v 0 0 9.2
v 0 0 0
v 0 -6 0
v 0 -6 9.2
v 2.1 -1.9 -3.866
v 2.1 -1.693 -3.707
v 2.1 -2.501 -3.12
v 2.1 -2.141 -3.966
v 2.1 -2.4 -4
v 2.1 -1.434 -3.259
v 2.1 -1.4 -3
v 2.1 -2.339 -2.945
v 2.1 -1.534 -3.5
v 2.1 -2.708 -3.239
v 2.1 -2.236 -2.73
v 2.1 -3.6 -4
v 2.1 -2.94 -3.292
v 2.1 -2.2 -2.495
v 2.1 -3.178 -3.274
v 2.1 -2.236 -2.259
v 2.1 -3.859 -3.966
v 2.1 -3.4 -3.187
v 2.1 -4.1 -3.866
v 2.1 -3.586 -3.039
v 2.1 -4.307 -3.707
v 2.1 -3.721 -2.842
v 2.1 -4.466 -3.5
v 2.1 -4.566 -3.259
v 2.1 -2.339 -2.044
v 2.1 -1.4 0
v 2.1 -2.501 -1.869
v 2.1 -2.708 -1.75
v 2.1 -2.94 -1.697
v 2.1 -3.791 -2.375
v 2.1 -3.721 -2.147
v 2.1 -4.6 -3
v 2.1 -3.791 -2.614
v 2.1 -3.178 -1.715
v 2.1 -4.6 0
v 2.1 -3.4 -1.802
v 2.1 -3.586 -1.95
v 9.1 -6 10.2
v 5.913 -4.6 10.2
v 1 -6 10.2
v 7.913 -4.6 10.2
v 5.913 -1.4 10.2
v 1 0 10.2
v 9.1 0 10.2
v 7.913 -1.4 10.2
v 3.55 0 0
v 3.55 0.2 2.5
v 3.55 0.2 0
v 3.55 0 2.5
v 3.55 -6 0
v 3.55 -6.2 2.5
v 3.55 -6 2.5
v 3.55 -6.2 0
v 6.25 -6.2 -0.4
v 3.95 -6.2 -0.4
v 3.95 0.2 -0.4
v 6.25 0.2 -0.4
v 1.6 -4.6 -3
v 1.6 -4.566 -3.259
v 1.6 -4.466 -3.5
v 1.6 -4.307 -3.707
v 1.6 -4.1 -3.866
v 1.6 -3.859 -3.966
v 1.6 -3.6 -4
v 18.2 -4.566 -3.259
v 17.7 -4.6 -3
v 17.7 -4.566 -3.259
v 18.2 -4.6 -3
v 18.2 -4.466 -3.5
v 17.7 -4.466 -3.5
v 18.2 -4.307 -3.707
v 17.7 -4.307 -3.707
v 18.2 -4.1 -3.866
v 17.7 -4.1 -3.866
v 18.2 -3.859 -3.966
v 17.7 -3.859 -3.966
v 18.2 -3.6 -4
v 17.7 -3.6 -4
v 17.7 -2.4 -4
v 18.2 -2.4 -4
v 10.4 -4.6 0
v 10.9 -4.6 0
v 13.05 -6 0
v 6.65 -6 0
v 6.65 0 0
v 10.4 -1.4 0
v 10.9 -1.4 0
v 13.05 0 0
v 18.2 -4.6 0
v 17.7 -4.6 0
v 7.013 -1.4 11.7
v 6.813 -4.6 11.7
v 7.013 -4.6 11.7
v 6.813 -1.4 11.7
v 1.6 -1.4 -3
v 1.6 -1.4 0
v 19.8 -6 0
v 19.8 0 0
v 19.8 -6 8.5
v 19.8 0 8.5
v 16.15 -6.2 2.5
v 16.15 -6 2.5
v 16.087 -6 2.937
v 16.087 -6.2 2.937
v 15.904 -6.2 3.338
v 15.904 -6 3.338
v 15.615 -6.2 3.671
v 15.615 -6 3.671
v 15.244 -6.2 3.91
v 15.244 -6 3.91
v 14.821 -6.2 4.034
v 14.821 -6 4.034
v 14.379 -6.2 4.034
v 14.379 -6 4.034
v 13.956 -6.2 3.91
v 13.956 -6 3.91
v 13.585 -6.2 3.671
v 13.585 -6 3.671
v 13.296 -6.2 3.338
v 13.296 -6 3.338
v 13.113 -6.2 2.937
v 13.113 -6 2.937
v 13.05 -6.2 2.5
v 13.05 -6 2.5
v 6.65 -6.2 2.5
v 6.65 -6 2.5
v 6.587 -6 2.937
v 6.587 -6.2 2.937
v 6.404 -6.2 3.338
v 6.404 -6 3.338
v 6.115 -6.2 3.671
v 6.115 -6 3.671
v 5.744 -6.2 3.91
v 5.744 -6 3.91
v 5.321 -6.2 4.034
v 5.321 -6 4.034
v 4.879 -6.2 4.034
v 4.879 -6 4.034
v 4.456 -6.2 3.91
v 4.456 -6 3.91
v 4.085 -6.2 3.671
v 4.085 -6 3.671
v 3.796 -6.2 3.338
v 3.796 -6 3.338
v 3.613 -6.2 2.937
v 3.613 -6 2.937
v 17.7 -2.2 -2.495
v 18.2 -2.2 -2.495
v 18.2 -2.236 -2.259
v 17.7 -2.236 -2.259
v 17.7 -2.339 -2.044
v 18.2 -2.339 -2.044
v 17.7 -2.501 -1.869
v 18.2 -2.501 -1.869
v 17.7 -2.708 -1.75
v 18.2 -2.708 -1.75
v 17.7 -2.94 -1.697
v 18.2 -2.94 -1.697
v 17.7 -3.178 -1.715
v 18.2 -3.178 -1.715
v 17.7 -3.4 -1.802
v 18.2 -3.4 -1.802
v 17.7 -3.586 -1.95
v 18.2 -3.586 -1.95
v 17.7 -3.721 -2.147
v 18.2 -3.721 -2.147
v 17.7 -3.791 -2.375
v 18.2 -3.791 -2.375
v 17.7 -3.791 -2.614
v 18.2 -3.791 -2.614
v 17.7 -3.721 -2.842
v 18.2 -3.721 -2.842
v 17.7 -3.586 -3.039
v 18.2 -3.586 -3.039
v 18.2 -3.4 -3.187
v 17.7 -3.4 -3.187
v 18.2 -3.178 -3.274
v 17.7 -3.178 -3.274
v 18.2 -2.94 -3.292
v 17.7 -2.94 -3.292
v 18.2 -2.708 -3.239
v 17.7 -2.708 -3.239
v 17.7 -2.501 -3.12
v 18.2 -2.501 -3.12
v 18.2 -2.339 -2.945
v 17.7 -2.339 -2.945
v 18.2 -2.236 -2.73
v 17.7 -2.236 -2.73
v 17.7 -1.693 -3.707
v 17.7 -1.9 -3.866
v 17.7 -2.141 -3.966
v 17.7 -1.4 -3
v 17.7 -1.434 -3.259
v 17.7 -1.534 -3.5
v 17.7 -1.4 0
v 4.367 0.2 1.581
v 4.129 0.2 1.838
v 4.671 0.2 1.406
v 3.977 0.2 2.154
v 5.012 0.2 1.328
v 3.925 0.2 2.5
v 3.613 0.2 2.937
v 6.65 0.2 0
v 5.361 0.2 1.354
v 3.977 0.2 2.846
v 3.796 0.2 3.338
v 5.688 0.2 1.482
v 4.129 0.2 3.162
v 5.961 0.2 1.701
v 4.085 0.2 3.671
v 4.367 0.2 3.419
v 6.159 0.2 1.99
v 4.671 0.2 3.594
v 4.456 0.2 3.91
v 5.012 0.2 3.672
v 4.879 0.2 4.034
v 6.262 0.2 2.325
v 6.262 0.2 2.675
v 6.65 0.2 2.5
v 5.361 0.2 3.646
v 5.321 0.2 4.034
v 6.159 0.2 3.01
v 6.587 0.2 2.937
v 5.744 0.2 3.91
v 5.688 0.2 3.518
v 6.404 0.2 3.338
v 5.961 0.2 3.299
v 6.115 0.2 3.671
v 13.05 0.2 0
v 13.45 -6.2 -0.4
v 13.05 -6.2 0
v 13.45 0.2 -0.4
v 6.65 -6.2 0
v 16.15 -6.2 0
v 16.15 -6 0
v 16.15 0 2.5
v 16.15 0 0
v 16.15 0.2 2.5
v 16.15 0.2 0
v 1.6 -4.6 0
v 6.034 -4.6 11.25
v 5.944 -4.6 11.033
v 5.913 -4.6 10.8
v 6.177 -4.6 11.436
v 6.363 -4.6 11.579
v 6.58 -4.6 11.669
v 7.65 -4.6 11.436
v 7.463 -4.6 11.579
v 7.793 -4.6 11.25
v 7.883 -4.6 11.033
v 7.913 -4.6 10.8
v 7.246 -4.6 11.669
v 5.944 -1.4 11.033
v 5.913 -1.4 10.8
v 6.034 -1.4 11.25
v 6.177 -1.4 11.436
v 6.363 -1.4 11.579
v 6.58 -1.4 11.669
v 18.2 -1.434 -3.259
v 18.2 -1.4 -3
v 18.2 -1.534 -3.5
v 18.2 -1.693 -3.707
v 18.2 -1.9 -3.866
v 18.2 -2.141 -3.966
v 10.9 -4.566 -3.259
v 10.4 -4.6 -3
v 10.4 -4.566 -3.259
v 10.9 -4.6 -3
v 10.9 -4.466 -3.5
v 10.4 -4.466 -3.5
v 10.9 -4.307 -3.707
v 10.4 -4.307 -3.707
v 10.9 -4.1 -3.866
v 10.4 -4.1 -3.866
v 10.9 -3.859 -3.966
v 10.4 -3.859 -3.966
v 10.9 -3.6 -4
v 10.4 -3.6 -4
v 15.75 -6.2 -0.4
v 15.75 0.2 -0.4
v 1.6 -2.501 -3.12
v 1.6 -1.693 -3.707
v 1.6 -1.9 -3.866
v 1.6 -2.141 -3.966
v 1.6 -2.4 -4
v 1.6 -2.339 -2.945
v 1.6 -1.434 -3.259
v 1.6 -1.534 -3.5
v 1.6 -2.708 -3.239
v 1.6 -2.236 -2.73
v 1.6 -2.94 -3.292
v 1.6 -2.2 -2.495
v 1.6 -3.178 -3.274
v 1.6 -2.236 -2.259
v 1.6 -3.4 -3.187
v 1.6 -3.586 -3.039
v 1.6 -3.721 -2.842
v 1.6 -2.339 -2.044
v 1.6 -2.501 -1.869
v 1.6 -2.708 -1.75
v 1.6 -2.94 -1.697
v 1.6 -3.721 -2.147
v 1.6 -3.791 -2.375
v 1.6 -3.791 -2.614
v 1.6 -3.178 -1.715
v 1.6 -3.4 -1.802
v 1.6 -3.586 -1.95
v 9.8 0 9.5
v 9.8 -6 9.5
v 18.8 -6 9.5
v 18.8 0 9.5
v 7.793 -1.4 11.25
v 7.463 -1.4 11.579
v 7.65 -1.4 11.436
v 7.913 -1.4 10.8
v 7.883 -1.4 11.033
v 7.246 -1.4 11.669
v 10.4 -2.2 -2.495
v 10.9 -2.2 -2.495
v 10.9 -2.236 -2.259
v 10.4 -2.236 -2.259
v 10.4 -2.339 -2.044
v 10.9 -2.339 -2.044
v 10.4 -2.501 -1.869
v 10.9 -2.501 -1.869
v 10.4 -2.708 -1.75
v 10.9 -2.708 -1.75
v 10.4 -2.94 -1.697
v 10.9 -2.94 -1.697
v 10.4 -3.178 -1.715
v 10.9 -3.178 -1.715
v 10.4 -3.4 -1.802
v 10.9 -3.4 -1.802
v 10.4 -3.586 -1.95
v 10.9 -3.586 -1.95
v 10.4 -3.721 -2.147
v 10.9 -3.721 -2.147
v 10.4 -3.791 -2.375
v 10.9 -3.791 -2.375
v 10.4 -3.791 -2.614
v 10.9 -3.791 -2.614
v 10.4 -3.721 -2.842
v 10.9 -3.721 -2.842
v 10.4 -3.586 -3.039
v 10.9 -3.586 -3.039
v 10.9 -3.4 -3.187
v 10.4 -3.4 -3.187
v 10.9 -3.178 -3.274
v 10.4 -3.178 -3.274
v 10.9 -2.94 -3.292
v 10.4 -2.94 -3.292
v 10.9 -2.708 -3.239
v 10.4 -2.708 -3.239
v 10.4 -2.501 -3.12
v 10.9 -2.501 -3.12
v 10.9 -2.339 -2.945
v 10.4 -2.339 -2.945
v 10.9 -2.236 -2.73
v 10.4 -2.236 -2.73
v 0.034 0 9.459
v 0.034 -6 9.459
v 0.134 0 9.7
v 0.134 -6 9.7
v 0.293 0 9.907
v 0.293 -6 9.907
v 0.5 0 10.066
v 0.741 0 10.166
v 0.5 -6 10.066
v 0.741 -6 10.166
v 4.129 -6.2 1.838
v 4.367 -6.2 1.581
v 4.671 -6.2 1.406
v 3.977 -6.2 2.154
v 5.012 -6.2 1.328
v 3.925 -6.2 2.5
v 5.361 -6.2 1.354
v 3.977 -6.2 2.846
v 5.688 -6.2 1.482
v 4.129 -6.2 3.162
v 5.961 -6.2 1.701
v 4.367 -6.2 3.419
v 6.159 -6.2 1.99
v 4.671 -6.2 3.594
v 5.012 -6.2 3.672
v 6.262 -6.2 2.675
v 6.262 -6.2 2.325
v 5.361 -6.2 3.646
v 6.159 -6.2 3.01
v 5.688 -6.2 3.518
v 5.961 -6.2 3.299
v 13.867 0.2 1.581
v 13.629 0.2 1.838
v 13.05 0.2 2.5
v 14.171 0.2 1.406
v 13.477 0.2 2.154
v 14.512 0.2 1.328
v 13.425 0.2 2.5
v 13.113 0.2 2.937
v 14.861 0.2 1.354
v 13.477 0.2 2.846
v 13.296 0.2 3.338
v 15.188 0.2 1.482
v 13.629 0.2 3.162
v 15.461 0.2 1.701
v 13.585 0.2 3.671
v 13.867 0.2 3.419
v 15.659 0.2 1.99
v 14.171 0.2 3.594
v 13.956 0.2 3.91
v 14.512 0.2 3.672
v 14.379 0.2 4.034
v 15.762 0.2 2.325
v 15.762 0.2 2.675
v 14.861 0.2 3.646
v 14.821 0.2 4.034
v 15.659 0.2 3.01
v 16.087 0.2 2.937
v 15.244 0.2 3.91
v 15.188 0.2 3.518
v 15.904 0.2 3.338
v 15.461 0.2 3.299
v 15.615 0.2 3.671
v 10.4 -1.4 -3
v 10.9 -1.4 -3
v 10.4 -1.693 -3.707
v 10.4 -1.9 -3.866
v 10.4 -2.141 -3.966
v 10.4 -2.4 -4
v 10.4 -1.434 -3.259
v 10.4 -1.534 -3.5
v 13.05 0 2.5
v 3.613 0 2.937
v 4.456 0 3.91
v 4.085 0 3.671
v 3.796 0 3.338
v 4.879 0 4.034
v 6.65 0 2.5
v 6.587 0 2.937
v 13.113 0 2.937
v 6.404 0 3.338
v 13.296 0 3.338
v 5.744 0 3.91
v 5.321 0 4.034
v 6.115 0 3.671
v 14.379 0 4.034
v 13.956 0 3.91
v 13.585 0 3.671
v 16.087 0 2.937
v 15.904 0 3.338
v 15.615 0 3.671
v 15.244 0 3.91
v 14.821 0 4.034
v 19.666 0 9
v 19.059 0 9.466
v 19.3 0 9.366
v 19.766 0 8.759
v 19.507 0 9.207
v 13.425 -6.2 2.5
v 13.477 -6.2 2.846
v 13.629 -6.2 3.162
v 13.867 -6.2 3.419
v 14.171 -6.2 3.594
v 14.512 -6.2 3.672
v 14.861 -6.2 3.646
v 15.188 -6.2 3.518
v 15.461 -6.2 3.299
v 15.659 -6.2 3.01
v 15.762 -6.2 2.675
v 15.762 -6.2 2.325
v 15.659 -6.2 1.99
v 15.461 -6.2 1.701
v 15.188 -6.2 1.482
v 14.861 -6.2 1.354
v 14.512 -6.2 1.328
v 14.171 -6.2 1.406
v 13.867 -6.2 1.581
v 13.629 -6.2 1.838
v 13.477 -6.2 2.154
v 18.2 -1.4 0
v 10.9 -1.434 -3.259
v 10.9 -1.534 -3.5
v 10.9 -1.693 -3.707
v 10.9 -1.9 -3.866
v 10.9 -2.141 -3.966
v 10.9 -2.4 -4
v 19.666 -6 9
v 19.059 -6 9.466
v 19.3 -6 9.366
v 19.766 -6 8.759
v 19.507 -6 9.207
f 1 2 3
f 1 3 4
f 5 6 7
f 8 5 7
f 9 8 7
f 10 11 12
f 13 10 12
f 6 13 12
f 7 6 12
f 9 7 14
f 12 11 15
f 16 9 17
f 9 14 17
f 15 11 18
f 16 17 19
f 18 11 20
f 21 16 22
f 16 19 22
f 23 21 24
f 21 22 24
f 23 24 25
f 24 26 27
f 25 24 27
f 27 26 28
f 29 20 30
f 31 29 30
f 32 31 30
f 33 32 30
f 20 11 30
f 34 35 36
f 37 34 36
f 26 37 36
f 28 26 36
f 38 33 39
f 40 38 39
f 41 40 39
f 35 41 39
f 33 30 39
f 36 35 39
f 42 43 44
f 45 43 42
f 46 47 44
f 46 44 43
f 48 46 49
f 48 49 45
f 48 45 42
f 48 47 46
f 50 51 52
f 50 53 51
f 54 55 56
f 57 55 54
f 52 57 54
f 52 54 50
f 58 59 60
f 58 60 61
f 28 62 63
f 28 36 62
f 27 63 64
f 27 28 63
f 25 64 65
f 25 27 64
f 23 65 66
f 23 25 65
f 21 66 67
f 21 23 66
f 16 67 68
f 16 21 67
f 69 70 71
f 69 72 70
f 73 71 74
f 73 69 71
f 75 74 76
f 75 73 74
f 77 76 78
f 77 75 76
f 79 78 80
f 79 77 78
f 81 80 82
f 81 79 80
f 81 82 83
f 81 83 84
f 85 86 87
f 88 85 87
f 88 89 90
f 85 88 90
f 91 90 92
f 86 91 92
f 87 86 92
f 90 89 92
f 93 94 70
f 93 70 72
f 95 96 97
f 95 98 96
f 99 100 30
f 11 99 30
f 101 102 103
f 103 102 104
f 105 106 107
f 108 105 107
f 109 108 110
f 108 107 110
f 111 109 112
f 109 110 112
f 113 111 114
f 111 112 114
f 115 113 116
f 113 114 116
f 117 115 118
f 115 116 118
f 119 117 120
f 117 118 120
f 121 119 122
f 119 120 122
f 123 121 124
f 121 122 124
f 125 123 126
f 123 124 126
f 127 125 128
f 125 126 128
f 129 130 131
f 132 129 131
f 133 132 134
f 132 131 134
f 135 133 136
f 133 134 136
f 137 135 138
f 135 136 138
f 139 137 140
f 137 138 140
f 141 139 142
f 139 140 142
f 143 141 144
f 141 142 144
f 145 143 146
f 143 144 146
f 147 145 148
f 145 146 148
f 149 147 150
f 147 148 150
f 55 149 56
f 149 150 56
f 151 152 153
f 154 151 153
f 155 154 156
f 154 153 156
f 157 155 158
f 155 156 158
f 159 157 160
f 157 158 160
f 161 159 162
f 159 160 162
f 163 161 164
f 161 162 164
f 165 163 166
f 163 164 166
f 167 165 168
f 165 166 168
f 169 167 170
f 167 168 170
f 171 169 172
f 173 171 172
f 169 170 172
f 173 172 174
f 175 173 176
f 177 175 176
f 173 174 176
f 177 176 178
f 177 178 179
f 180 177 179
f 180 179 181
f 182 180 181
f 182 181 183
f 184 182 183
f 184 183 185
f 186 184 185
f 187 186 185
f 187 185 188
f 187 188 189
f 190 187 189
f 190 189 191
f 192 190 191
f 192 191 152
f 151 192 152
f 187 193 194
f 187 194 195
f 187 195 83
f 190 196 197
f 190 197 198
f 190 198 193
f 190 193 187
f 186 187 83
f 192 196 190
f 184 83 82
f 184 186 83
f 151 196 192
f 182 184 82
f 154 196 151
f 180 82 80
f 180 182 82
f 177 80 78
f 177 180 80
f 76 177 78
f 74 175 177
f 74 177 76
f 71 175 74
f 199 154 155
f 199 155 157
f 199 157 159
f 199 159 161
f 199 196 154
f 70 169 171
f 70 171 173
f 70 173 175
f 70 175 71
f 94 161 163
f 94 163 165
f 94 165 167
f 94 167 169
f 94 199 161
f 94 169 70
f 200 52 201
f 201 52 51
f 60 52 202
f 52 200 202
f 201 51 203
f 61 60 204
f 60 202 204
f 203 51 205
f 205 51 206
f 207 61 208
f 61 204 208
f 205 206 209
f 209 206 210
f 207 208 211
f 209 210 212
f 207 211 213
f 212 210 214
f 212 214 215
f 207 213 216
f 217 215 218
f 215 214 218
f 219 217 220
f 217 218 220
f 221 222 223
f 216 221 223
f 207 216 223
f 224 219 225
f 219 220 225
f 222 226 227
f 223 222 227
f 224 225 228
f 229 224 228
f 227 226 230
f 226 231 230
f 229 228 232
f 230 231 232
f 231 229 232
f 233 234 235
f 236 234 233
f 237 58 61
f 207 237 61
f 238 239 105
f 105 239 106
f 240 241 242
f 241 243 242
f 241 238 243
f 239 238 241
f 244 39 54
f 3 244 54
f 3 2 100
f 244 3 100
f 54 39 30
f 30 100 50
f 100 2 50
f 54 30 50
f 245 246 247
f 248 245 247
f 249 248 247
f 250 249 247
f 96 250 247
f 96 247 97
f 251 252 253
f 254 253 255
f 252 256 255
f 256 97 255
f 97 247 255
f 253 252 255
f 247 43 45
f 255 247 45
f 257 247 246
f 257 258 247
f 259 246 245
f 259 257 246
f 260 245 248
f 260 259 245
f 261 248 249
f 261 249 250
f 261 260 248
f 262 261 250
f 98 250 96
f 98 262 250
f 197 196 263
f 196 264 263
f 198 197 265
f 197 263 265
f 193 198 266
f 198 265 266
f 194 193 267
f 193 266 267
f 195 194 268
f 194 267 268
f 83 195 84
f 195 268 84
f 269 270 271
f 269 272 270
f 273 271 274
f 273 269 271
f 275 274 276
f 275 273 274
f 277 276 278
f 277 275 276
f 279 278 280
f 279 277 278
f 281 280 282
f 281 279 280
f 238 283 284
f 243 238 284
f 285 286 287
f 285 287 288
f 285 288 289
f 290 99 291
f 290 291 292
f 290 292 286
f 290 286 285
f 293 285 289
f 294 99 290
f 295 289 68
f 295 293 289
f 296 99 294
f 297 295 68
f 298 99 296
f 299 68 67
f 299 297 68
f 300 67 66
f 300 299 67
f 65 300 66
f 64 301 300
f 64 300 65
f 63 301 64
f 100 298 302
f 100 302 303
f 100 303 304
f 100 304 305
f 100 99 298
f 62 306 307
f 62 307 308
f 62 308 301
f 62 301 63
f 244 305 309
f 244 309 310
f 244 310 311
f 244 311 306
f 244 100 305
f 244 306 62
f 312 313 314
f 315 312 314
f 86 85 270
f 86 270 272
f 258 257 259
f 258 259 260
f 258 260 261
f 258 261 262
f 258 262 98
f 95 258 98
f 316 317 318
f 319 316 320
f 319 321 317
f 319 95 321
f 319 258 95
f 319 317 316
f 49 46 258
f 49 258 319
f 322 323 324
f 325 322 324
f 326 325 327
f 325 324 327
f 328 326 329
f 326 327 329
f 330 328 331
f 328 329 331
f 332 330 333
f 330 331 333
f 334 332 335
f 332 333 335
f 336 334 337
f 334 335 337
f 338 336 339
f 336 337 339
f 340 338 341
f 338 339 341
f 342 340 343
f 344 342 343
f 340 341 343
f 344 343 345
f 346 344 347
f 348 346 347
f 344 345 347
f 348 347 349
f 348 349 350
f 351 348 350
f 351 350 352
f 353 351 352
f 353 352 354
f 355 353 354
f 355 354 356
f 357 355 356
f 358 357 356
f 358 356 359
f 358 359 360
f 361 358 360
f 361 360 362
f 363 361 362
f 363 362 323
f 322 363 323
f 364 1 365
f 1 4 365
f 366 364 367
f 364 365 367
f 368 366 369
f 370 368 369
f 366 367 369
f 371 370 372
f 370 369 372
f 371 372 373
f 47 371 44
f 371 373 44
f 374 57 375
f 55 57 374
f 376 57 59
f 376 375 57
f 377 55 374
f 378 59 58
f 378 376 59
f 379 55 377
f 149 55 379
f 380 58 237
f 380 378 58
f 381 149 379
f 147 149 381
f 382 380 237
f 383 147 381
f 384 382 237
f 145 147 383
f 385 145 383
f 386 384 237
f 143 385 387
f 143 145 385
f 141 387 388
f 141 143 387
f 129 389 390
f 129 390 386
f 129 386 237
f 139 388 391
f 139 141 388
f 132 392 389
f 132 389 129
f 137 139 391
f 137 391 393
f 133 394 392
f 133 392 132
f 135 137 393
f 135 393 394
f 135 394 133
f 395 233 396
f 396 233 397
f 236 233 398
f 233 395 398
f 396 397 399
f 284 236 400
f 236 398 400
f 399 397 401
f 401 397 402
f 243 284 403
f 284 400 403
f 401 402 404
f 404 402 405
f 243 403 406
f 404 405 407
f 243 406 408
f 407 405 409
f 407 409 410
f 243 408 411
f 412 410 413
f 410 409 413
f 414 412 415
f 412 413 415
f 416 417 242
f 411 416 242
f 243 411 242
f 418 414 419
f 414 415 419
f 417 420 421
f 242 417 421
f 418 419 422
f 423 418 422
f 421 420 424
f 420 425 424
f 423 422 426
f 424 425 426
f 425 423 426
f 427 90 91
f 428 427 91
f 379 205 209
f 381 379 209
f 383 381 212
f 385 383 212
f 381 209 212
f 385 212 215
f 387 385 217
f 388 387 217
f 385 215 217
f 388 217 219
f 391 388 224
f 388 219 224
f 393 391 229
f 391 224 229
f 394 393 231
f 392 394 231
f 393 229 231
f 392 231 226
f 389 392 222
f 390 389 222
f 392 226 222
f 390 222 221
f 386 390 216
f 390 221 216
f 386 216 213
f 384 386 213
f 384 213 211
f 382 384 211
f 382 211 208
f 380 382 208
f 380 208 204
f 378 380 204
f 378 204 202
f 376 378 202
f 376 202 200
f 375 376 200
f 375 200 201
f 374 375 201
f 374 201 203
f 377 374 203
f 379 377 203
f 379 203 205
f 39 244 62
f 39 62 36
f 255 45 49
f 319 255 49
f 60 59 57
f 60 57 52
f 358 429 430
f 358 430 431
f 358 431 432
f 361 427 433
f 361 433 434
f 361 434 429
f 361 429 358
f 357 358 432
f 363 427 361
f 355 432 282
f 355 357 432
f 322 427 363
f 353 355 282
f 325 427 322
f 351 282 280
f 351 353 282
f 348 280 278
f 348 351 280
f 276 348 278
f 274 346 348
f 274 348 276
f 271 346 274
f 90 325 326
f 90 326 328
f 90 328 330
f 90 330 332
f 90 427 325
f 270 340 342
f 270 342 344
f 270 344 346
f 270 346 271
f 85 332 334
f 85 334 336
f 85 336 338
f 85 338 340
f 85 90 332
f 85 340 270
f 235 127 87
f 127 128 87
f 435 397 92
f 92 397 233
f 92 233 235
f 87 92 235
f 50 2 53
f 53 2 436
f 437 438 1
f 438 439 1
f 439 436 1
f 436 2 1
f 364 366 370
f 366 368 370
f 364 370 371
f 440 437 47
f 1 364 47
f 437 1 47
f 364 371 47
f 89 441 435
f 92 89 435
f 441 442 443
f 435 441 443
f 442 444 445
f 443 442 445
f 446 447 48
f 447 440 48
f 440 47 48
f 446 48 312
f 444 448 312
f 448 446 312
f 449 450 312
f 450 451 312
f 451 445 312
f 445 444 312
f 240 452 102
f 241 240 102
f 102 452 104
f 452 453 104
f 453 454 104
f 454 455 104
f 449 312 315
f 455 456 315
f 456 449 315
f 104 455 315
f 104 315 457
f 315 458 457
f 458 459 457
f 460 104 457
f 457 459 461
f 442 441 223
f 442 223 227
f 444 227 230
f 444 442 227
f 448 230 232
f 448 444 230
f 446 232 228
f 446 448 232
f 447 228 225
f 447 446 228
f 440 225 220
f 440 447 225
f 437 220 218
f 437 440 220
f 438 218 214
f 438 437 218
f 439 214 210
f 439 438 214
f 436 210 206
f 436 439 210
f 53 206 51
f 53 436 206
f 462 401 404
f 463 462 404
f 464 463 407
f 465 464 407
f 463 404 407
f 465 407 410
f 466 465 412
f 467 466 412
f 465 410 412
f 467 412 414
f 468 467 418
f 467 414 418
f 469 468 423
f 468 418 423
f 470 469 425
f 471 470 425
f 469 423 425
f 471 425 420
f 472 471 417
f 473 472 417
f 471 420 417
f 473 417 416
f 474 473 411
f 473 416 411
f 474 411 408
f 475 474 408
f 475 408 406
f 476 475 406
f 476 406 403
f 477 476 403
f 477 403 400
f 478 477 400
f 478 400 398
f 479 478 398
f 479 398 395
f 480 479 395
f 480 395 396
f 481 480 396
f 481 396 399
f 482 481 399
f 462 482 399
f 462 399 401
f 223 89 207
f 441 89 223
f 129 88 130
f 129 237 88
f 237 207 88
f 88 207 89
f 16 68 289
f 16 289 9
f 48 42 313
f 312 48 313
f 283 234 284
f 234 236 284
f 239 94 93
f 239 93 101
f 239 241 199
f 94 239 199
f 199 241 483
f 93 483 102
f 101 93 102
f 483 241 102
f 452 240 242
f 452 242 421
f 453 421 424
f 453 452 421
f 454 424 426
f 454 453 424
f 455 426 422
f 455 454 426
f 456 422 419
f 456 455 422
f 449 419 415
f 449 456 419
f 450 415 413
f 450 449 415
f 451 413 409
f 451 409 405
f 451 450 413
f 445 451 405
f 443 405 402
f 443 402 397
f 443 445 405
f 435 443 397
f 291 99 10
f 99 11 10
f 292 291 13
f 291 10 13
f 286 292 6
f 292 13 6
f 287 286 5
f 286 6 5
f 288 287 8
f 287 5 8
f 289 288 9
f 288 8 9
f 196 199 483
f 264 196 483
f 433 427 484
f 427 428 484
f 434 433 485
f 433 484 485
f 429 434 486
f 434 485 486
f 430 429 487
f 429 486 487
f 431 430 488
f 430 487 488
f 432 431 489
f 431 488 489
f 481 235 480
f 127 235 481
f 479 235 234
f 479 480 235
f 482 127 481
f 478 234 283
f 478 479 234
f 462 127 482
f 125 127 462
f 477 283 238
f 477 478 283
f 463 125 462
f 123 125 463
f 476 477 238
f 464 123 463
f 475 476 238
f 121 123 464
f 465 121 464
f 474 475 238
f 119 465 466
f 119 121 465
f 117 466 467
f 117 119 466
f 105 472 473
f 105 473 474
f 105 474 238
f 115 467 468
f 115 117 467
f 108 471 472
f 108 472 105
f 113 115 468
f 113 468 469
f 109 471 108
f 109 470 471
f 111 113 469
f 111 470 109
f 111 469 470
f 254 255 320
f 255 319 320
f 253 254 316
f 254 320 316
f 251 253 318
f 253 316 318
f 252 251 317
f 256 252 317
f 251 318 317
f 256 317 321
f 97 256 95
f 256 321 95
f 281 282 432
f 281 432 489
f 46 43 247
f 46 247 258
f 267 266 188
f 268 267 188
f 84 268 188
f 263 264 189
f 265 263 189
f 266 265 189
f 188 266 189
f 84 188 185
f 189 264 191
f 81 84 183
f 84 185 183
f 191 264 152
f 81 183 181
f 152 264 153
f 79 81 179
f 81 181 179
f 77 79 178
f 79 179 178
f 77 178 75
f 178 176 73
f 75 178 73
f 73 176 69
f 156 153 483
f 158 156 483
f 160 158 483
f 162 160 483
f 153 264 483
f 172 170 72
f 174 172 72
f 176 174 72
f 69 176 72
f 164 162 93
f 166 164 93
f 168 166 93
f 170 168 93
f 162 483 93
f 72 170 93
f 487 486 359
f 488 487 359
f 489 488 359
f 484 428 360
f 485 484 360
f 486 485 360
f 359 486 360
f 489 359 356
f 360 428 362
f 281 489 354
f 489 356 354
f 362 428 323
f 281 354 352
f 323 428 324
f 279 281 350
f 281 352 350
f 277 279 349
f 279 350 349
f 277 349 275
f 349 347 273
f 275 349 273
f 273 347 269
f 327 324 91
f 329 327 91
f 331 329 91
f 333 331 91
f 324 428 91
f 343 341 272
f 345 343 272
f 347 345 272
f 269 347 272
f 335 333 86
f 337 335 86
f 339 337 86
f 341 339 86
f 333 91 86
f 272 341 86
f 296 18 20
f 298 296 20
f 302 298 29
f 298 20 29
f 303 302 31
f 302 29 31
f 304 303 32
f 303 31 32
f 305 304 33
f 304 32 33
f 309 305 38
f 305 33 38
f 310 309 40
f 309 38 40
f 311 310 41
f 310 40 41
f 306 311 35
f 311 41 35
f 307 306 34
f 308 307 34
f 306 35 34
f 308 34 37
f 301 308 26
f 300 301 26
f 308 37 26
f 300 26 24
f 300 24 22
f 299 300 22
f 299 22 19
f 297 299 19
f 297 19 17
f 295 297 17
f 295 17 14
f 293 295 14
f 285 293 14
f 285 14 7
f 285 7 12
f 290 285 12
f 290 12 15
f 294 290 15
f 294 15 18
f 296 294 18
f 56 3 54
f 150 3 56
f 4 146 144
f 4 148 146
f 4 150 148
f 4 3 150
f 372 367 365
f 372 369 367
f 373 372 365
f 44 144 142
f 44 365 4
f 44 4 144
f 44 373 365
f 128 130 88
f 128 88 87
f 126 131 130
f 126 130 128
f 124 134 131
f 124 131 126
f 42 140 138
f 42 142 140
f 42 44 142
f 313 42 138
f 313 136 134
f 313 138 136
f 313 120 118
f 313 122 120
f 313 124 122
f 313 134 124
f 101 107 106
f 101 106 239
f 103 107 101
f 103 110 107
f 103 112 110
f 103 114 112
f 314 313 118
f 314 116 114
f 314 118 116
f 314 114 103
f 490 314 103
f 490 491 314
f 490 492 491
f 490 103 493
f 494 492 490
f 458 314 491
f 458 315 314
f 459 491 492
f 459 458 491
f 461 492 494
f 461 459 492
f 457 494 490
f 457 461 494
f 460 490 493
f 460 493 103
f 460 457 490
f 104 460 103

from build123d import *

# Parameters (mm, degrees)
F0_W      = 19.8
F0_H      = 10.2
F1_DEPTH  = 6
F3_DEPTH  = 0.2
F5_DEPTH  = 6.4
F6_DEPTH  = 6.4
F7_SIZE   = 0.39999
F9_DEPTH  = 6.201
F10_R     = 1
F12_D     = 2.35
F14_D     = 2.35
F15_W     = 2
F15_H     = 3.2
F16_DEPTH = 1.5
F17_R     = 0.9
F18_W     = 0.5
F18_H     = 3.2
F19_DEPTH = 4
F21_D     = 1.6
F22_R     = 1


# Not quite as in the source:
# - a fillet or chamfer is up to 0.001 mm smaller than in the source, because OpenCascade refuses the exact size


with BuildPart() as f1:
    # F0 (on Front) → F1 (new body)
    with BuildSketch(Plane.XZ):
        with Locations((9.9, 5.1)):
            Rectangle(F0_W, F0_H)
    extrude(amount=F1_DEPTH)

    # F2 (on face) → F3 (join)
    with BuildSketch(Plane.XZ.offset(6)):
        with BuildLine():
            ThreePointArc((3.55, 2.5), (5.1, 0.95), (6.65, 2.5))
            ThreePointArc((6.65, 2.5), (5.1, 4.05), (3.55, 2.5))
        make_face()
        with BuildLine():
            Line((6.65, -0.4), (6.65, 2.5))
            ThreePointArc((6.65, 2.5), (5.1, 0.95), (3.55, 2.5))
            Line((3.55, 2.5), (3.55, -0.4))
            Line((3.55, -0.4), (6.65, -0.4))
        make_face()
        with BuildLine():
            ThreePointArc((13.05, 2.5), (14.6, 0.95), (16.15, 2.5))
            ThreePointArc((16.15, 2.5), (14.6, 4.05), (13.05, 2.5))
        make_face()
        with BuildLine():
            Line((16.15, -0.4), (16.15, 2.5))
            ThreePointArc((16.15, 2.5), (14.6, 0.95), (13.05, 2.5))
            Line((13.05, 2.5), (13.05, -0.4))
            Line((13.05, -0.4), (16.15, -0.4))
        make_face()
    extrude(amount=F3_DEPTH)

    # F4 (on face) → F5 (join)
    with BuildSketch(Plane.XZ.offset(6.2)):
        with BuildLine():
            Line((6.65, -0.4), (6.65, 2.5))
            ThreePointArc((6.65, 2.5), (5.1, 4.05), (3.55, 2.5))
            Line((3.55, 2.5), (3.55, -0.4))
            Line((3.55, -0.4), (6.65, -0.4))
        make_face()
    extrude(amount=-F5_DEPTH)

    # F6 (add): a face of the model
    f6_faces = [f1.faces().sort_by_distance(p)[0] for p in [
        (14.6, -6.2, 1.6732176073),
    ]]
    extrude(f6_faces, amount=-F6_DEPTH)

    # F7 (size 0.4 in the source; OpenCascade refuses exactly that, so slightly less here)
    f7_edges = [f1.edges().sort_by_distance(p)[0] for p in [
        (3.55, -3, -0.4),
        (6.65, -3, -0.4),
        (13.05, -3, -0.4),
        (16.15, -3, -0.4),
    ]]
    chamfer(f7_edges, length=F7_SIZE)

    # F8 (on face) → F9 (cut, through all)
    with BuildSketch(Plane.XZ.offset(6)):
        Polygon((19.8, 10.2), (9.1, 10.2), (9.8, 9.5), (19.8, 9.5), align=None)
    extrude(amount=-F9_DEPTH, mode=Mode.SUBTRACT)

    # F10
    f10_edges = [f1.edges().sort_by_distance(p)[0] for p in [
        (0, -3, 10.2),
        (19.8, -3, 9.5),
    ]]
    fillet(f10_edges, radius=F10_R)

    # F12 (through all)
    with Locations(Plane.XZ.offset(6.2)):
        with Locations((5.1, 2.5)):
            Hole(F12_D / 2)

    # F14 (through all)
    with Locations(Plane.XZ.offset(6.2)):
        with Locations((14.6, 2.5)):
            Hole(F14_D / 2)

    # F15 (on face) → F16 (join)
    with BuildSketch(Plane.XY.offset(10.2)):
        with Locations((6.9132626522, -3)):
            Rectangle(F15_W, F15_H)
    extrude(amount=F16_DEPTH)

    # F17
    f17_edges = [f1.edges().sort_by_distance(p)[0] for p in [
        (5.913263, -3, 11.7),
        (7.913263, -3, 11.7),
    ]]
    fillet(f17_edges, radius=F17_R)

    # F18 (on face) → F19 (join)
    with BuildSketch(Plane(origin=(0, 0, 0), x_dir=(1, 0, 0), z_dir=(0, 0, -1))):
        with Locations((1.85, 3)):
            Rectangle(F18_W, F18_H)
        with Locations((10.65, 3)):
            Rectangle(F18_W, F18_H)
        with Locations((17.95, 3)):
            Rectangle(F18_W, F18_H)
    extrude(amount=F19_DEPTH)

    # F21 (through all)
    with Locations(Plane(origin=(1.6, 0, 0), x_dir=(0, -1, 0), z_dir=(-1, 0, 0))):
        with Locations((3, -2.4945095647)):
            Hole(F21_D / 2)

    # F22
    f22_edges = [f1.edges().sort_by_distance(p)[0] for p in [
        (17.95, -4.6, -4),
        (10.65, -4.6, -4),
        (1.85, -4.6, -4),
        (1.85, -1.4, -4),
        (10.65, -1.4, -4),
        (17.95, -1.4, -4),
    ]]
    fillet(f22_edges, radius=F22_R)


solid = f1.part
